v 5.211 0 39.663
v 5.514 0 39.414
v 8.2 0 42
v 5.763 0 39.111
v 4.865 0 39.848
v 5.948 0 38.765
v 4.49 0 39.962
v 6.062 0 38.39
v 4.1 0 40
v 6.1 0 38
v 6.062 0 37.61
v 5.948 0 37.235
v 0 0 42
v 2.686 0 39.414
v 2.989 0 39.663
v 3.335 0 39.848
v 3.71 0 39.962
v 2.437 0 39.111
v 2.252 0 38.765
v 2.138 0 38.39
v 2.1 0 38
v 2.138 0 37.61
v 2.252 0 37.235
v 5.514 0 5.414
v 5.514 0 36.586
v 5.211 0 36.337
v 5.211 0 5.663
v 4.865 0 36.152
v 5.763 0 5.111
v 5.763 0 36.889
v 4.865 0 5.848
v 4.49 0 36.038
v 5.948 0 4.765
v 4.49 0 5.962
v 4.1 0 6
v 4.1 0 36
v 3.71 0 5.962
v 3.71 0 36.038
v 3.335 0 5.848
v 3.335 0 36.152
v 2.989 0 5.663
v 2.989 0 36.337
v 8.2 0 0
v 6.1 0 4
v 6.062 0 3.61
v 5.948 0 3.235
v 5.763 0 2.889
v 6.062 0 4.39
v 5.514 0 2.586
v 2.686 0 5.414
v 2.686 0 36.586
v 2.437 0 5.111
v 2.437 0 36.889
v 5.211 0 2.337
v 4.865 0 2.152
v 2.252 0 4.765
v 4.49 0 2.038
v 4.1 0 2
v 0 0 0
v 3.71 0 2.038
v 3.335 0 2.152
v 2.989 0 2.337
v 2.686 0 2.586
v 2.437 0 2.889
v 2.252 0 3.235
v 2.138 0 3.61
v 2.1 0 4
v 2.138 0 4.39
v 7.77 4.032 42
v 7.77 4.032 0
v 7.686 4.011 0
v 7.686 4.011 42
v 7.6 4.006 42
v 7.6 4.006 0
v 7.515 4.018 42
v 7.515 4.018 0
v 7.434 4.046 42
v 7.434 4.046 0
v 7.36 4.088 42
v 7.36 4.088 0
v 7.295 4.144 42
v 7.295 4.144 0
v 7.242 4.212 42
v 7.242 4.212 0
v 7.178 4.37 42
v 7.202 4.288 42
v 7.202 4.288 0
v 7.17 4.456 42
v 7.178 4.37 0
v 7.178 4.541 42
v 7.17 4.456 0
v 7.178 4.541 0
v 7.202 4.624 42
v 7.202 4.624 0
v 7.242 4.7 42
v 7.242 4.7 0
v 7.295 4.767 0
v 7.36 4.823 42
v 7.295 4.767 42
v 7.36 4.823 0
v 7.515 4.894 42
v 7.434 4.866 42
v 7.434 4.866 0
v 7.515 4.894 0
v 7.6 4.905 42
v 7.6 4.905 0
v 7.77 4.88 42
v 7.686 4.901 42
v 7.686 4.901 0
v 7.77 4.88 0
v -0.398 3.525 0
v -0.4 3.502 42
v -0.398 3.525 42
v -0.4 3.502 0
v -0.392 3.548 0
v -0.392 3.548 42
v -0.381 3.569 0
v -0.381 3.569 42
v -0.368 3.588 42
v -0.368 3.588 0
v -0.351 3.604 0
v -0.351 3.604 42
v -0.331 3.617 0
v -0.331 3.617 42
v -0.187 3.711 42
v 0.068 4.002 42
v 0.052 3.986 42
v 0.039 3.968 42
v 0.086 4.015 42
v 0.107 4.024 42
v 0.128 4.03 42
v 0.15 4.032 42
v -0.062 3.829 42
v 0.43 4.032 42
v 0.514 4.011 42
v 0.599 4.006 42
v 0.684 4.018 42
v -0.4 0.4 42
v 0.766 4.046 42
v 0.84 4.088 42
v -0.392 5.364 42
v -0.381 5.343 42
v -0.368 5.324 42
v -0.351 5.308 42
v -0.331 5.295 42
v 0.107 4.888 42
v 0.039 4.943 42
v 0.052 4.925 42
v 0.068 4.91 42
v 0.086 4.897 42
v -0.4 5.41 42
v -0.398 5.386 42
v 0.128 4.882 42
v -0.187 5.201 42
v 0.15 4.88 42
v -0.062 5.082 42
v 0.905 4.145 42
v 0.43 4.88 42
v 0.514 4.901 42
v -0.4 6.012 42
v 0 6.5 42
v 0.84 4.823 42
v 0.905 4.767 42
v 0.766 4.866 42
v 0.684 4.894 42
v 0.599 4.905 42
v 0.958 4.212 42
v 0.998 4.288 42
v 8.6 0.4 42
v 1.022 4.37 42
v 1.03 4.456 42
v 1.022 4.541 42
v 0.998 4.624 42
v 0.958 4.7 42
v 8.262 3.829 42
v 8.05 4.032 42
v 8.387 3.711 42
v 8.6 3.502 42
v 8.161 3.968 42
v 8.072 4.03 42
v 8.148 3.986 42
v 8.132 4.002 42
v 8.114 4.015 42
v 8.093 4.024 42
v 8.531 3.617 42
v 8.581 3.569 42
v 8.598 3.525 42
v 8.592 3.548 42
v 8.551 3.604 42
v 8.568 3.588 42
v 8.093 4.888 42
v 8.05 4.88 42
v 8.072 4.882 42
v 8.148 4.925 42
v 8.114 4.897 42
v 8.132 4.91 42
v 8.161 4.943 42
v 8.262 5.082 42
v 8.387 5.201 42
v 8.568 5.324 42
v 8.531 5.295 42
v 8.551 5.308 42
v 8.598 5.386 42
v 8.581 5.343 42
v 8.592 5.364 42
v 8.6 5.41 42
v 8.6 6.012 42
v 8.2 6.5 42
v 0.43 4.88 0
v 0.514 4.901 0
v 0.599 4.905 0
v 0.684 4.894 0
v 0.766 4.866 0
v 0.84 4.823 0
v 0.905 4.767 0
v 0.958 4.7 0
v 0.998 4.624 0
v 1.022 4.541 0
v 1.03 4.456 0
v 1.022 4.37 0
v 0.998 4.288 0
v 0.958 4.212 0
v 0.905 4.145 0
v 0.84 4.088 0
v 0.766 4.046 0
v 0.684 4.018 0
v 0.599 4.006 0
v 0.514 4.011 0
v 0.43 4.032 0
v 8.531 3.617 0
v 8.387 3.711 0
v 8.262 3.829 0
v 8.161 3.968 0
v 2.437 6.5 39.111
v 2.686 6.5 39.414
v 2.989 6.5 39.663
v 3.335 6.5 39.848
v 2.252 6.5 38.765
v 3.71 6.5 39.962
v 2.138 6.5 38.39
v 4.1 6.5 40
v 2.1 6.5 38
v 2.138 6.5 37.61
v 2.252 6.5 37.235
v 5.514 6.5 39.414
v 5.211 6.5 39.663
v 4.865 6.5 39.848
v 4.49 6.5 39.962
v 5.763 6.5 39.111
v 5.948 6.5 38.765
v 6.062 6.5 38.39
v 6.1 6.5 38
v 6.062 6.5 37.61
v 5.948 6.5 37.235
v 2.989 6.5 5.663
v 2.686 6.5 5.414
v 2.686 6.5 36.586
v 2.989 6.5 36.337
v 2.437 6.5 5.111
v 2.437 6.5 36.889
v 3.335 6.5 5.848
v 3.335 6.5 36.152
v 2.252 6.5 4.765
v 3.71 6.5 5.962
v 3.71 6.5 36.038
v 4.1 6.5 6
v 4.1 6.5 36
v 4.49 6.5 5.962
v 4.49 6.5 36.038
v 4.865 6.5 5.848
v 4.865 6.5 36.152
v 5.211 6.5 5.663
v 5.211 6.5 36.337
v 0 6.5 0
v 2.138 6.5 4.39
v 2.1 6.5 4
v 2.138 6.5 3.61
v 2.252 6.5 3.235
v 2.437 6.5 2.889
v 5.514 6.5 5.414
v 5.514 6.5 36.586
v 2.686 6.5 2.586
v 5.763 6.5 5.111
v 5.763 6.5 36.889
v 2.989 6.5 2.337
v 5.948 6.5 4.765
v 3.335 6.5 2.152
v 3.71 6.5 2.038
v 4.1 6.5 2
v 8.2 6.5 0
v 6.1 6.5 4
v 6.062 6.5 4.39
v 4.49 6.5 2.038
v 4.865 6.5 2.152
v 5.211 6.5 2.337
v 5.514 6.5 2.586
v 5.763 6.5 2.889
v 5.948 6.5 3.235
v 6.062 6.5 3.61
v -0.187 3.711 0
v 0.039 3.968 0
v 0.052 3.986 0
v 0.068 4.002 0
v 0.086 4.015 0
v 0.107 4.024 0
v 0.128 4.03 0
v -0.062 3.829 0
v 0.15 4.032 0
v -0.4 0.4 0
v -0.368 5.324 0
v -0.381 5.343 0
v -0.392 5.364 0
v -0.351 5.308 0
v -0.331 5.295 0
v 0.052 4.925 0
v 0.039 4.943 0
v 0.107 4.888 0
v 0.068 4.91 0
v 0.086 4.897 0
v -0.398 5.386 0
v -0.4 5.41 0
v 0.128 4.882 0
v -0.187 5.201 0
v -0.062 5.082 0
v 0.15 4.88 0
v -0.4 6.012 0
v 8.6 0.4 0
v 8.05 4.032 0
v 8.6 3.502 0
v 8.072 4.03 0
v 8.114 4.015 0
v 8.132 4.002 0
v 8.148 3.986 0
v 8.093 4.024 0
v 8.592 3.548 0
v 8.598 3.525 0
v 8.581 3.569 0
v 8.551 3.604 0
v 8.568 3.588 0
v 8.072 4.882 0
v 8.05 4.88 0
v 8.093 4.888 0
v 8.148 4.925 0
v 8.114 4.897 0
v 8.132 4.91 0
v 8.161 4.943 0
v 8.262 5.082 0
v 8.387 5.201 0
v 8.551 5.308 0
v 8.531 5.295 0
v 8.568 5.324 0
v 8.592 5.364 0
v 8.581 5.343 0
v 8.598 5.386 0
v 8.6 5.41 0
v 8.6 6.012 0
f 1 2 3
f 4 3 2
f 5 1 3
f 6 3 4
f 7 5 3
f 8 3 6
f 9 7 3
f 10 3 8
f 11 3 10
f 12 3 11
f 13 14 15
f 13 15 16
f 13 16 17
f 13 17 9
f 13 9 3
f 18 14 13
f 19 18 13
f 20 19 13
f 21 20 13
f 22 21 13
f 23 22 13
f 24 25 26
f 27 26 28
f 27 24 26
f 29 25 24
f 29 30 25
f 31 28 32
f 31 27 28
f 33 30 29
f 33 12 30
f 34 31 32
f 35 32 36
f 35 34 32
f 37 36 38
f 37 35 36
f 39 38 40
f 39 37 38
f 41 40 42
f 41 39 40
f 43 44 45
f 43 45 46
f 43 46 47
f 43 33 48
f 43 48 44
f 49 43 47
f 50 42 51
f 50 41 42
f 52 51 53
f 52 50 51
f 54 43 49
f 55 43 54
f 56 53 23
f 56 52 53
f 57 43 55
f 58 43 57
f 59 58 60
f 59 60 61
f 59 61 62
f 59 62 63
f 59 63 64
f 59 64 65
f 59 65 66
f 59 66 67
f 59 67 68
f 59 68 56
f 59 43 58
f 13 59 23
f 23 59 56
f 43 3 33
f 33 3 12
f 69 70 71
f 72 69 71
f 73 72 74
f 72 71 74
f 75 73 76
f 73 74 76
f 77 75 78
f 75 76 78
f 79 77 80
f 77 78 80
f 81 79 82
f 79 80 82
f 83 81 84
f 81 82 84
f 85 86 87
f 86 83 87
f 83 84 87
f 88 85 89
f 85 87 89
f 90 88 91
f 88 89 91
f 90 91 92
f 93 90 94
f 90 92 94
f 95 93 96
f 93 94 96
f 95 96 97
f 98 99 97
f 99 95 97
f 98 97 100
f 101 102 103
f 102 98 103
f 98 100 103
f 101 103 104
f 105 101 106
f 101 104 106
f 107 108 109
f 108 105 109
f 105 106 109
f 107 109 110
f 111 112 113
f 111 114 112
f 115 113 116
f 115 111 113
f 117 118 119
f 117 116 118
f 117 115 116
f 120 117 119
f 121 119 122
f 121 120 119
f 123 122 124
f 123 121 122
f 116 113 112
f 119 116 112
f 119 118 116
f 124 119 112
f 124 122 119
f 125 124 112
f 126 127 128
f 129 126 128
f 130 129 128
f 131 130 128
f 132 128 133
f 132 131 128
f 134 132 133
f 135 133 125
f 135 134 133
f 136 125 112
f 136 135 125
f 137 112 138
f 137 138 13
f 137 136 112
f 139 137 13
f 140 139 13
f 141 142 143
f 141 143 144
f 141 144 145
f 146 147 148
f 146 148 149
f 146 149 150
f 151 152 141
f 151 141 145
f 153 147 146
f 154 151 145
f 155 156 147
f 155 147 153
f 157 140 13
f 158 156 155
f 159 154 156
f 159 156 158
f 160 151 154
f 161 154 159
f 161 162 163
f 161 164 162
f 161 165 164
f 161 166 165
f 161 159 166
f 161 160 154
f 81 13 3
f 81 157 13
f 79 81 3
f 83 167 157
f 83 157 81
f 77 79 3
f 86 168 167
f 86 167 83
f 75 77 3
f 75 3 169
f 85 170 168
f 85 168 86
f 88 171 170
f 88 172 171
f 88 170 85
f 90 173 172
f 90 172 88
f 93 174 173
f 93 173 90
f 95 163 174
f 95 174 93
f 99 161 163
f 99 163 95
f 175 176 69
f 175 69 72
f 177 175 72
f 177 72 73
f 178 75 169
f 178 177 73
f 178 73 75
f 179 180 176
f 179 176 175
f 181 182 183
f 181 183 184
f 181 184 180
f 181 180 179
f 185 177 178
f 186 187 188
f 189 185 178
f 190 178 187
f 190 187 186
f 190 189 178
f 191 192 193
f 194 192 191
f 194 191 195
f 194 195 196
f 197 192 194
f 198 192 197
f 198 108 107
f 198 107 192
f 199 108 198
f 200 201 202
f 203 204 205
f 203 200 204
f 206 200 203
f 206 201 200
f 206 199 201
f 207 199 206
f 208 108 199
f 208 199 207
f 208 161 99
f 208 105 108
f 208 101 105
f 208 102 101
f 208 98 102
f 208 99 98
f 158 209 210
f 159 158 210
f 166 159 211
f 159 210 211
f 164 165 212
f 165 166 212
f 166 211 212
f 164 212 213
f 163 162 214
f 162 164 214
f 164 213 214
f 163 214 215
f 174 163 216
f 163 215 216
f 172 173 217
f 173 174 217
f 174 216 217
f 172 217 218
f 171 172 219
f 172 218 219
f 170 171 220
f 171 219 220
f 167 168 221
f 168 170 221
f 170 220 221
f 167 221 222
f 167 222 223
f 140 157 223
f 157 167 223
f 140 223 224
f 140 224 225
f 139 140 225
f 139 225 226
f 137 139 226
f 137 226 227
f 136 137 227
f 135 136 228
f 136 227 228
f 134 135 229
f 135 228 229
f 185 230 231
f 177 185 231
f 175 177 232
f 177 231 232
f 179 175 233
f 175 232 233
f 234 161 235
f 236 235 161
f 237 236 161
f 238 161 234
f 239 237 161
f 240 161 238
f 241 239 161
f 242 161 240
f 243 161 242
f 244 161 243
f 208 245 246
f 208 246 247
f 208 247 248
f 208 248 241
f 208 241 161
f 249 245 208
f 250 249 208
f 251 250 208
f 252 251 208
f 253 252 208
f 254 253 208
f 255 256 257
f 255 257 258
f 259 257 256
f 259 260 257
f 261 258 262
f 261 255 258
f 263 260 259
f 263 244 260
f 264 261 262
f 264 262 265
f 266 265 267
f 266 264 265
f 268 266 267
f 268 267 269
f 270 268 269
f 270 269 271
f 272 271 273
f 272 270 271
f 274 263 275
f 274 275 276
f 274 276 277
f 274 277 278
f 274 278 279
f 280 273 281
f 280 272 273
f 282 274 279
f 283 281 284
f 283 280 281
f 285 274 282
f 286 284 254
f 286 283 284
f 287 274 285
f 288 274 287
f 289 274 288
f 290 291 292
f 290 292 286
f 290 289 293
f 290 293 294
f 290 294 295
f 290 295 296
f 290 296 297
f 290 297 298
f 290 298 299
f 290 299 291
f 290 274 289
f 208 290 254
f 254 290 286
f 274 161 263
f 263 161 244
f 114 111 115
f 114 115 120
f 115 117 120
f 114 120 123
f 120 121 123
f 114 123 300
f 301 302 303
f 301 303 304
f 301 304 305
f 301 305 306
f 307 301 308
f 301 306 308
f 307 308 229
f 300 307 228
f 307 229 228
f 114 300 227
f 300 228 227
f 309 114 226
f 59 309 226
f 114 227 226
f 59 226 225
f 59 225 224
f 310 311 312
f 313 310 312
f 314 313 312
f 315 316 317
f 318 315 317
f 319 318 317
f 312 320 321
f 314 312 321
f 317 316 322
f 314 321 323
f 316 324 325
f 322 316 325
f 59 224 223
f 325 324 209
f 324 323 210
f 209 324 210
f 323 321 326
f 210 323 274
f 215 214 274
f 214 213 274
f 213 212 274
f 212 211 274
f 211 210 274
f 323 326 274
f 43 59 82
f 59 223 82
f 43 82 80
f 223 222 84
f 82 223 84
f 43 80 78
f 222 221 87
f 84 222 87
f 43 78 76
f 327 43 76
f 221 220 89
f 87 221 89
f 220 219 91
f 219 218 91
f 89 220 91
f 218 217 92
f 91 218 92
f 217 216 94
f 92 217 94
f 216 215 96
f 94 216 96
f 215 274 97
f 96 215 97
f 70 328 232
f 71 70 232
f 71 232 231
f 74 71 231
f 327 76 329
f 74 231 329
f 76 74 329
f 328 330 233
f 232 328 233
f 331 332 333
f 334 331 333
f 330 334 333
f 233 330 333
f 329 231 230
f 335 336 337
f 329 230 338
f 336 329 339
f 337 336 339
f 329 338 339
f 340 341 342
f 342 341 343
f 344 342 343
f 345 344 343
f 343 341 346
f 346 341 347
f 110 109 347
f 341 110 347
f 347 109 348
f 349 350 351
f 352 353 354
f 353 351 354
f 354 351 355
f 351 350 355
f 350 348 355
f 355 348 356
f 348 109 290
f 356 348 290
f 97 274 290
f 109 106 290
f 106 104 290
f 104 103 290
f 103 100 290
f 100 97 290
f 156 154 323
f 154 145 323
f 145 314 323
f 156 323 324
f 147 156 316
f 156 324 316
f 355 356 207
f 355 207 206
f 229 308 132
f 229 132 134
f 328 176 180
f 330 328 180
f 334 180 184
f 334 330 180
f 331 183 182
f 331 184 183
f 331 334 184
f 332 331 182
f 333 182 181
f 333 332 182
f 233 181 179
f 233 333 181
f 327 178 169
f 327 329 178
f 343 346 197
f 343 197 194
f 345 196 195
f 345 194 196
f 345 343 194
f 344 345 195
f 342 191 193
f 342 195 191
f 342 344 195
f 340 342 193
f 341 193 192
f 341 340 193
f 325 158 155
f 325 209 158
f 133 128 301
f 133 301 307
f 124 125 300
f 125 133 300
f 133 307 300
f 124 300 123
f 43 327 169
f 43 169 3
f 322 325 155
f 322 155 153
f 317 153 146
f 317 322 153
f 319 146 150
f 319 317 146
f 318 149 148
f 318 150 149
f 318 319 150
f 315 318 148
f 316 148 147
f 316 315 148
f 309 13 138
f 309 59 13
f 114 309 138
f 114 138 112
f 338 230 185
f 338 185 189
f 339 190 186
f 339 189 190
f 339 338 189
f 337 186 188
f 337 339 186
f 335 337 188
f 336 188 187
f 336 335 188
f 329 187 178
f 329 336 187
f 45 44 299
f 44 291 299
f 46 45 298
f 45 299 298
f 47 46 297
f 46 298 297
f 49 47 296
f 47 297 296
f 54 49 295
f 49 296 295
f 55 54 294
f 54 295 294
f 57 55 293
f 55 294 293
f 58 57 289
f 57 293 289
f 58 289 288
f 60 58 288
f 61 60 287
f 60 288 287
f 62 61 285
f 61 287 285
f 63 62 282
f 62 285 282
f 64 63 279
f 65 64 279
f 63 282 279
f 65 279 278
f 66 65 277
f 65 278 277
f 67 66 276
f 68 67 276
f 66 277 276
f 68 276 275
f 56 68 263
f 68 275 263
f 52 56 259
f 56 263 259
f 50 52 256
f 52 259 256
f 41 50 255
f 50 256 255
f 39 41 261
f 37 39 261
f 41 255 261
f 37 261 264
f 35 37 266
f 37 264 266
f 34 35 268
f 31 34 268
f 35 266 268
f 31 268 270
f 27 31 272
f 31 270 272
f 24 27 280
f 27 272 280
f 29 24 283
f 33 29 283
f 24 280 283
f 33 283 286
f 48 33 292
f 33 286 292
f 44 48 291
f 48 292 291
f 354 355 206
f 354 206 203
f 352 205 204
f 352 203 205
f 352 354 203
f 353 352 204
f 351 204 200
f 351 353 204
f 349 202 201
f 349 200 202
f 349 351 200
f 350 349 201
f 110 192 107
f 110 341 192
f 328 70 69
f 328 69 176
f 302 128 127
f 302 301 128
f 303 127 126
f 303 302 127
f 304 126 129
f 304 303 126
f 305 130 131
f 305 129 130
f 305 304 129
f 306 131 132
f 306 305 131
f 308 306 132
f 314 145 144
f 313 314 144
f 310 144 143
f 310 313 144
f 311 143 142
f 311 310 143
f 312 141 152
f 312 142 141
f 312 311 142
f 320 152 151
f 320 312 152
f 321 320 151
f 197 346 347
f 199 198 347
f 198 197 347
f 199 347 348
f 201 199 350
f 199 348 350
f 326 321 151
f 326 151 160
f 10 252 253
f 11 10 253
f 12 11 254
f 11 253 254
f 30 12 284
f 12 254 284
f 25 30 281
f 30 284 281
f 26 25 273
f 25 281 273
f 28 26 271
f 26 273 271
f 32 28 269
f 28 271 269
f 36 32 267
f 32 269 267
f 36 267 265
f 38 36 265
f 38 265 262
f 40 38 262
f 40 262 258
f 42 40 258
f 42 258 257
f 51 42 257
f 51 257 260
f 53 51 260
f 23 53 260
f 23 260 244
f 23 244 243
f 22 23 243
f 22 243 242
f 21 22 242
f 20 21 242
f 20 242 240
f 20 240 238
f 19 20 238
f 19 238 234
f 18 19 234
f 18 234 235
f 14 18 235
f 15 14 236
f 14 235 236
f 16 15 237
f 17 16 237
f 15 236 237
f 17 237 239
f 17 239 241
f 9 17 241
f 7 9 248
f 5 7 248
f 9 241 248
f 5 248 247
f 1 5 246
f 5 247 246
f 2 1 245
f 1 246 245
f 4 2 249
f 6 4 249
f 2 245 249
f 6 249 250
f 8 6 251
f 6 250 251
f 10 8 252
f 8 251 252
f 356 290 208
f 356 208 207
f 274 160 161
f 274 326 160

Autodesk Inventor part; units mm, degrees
ref_plane "YZ Plane" through (0, 0, 0) normal (1, 0, 0) x (0, 1, 0)
ref_plane "XZ Plane" through (0, 0, 0) normal (0, 1, 0) x (-1, 0, 0)
ref_plane "XY Plane" through (0, 0, 0) normal (0, 0, 1) x (1, 0, 0)
sketch "Sketch1" plane through (0, 0, 0) normal (0, 0, 1) x (1, 0, 0)
  line L0 (8.2, 0) -> (0, 0)
  line L1 (8.6, 0.4) -> (8.2, 0)
  line L2 (8.6, 3.502) -> (8.6, 0.4)
  arc A0 (8.6, 3.502) -> (8.531, 3.6168) centre (8.47, 3.502) ccw
  arc A1 (8.1612, 3.9682) -> (8.531, 3.6168) centre (8.9765, 4.4558) ccw
  arc A2 (8.1612, 3.9682) -> (8.0496, 4.0315) centre (8.0496, 3.9015) ccw
  line L3 (7.7695, 4.0315) -> (8.0496, 4.0315)
  arc A3 (7.7695, 4.8802) -> (7.7695, 4.0315) centre (7.6197, 4.4558) ccw
  line L4 (8.0496, 4.8802) -> (7.7695, 4.8802)
  arc A4 (8.0496, 4.8802) -> (8.1612, 4.9434) centre (8.0496, 5.0102) ccw
  arc A5 (8.531, 5.2949) -> (8.1612, 4.9434) centre (8.9765, 4.4558) ccw
  arc A6 (8.531, 5.2949) -> (8.6, 5.4097) centre (8.47, 5.4097) ccw
  line L5 (8.6, 6.0117) -> (8.6, 5.4097)
  line L6 (8.2, 6.5) -> (8.6, 6.0117)
  line L7 (0, 6.5) -> (8.2, 6.5)
  line L8 (-0.4, 6.0117) -> (0, 6.5)
  line L9 (-0.4, 5.4097) -> (-0.4, 6.0117)
  arc A7 (-0.4, 5.4097) -> (-0.331, 5.2949) centre (-0.27, 5.4097) ccw
  arc A8 (0.0388, 4.9434) -> (-0.331, 5.2949) centre (-0.7765, 4.4558) ccw
  arc A9 (0.0388, 4.9434) -> (0.1504, 4.8802) centre (0.1504, 5.0102) ccw
  line L10 (0.4305, 4.8802) -> (0.1504, 4.8802)
  arc A10 (0.4305, 4.0315) -> (0.4305, 4.8802) centre (0.5803, 4.4558) ccw
  line L11 (0.1504, 4.0315) -> (0.4305, 4.0315)
  arc A11 (0.1504, 4.0315) -> (0.0388, 3.9682) centre (0.1504, 3.9015) ccw
  arc A12 (-0.331, 3.6168) -> (0.0388, 3.9682) centre (-0.7765, 4.4558) ccw
  arc A13 (-0.331, 3.6168) -> (-0.4, 3.502) centre (-0.27, 3.502) ccw
  line L12 (-0.4, 0.4) -> (-0.4, 3.502)
  line L13 (0, 0) -> (-0.4, 0.4)
  point P0 (4.1, 0)
extrude "Extrusion1" add sketch "Sketch1" along normal blind 42
sketch "Sketch2" plane through (0, 6.5, 0) normal (0, 1, 0) x (1, 0, 0)
  circle A0 centre (4.1, -4) radius 2
  circle A1 centre (4.1, -38) radius 2
  line L0 (8.2, 0) -> (0, 0) projected
  line L1 (4.1, 0) -> (4.1, -42)
  line L2 (8.2, -42) -> (0, -42) projected
  dimension "d2" = 4
  dimension "d3" = 4
  dimension "d4" = 4
  dimension "d5" = 4
extrude "Extrusion2" cut sketch "Sketch2" against normal blind 10
properties part number "mgn9_carriage_holder"
